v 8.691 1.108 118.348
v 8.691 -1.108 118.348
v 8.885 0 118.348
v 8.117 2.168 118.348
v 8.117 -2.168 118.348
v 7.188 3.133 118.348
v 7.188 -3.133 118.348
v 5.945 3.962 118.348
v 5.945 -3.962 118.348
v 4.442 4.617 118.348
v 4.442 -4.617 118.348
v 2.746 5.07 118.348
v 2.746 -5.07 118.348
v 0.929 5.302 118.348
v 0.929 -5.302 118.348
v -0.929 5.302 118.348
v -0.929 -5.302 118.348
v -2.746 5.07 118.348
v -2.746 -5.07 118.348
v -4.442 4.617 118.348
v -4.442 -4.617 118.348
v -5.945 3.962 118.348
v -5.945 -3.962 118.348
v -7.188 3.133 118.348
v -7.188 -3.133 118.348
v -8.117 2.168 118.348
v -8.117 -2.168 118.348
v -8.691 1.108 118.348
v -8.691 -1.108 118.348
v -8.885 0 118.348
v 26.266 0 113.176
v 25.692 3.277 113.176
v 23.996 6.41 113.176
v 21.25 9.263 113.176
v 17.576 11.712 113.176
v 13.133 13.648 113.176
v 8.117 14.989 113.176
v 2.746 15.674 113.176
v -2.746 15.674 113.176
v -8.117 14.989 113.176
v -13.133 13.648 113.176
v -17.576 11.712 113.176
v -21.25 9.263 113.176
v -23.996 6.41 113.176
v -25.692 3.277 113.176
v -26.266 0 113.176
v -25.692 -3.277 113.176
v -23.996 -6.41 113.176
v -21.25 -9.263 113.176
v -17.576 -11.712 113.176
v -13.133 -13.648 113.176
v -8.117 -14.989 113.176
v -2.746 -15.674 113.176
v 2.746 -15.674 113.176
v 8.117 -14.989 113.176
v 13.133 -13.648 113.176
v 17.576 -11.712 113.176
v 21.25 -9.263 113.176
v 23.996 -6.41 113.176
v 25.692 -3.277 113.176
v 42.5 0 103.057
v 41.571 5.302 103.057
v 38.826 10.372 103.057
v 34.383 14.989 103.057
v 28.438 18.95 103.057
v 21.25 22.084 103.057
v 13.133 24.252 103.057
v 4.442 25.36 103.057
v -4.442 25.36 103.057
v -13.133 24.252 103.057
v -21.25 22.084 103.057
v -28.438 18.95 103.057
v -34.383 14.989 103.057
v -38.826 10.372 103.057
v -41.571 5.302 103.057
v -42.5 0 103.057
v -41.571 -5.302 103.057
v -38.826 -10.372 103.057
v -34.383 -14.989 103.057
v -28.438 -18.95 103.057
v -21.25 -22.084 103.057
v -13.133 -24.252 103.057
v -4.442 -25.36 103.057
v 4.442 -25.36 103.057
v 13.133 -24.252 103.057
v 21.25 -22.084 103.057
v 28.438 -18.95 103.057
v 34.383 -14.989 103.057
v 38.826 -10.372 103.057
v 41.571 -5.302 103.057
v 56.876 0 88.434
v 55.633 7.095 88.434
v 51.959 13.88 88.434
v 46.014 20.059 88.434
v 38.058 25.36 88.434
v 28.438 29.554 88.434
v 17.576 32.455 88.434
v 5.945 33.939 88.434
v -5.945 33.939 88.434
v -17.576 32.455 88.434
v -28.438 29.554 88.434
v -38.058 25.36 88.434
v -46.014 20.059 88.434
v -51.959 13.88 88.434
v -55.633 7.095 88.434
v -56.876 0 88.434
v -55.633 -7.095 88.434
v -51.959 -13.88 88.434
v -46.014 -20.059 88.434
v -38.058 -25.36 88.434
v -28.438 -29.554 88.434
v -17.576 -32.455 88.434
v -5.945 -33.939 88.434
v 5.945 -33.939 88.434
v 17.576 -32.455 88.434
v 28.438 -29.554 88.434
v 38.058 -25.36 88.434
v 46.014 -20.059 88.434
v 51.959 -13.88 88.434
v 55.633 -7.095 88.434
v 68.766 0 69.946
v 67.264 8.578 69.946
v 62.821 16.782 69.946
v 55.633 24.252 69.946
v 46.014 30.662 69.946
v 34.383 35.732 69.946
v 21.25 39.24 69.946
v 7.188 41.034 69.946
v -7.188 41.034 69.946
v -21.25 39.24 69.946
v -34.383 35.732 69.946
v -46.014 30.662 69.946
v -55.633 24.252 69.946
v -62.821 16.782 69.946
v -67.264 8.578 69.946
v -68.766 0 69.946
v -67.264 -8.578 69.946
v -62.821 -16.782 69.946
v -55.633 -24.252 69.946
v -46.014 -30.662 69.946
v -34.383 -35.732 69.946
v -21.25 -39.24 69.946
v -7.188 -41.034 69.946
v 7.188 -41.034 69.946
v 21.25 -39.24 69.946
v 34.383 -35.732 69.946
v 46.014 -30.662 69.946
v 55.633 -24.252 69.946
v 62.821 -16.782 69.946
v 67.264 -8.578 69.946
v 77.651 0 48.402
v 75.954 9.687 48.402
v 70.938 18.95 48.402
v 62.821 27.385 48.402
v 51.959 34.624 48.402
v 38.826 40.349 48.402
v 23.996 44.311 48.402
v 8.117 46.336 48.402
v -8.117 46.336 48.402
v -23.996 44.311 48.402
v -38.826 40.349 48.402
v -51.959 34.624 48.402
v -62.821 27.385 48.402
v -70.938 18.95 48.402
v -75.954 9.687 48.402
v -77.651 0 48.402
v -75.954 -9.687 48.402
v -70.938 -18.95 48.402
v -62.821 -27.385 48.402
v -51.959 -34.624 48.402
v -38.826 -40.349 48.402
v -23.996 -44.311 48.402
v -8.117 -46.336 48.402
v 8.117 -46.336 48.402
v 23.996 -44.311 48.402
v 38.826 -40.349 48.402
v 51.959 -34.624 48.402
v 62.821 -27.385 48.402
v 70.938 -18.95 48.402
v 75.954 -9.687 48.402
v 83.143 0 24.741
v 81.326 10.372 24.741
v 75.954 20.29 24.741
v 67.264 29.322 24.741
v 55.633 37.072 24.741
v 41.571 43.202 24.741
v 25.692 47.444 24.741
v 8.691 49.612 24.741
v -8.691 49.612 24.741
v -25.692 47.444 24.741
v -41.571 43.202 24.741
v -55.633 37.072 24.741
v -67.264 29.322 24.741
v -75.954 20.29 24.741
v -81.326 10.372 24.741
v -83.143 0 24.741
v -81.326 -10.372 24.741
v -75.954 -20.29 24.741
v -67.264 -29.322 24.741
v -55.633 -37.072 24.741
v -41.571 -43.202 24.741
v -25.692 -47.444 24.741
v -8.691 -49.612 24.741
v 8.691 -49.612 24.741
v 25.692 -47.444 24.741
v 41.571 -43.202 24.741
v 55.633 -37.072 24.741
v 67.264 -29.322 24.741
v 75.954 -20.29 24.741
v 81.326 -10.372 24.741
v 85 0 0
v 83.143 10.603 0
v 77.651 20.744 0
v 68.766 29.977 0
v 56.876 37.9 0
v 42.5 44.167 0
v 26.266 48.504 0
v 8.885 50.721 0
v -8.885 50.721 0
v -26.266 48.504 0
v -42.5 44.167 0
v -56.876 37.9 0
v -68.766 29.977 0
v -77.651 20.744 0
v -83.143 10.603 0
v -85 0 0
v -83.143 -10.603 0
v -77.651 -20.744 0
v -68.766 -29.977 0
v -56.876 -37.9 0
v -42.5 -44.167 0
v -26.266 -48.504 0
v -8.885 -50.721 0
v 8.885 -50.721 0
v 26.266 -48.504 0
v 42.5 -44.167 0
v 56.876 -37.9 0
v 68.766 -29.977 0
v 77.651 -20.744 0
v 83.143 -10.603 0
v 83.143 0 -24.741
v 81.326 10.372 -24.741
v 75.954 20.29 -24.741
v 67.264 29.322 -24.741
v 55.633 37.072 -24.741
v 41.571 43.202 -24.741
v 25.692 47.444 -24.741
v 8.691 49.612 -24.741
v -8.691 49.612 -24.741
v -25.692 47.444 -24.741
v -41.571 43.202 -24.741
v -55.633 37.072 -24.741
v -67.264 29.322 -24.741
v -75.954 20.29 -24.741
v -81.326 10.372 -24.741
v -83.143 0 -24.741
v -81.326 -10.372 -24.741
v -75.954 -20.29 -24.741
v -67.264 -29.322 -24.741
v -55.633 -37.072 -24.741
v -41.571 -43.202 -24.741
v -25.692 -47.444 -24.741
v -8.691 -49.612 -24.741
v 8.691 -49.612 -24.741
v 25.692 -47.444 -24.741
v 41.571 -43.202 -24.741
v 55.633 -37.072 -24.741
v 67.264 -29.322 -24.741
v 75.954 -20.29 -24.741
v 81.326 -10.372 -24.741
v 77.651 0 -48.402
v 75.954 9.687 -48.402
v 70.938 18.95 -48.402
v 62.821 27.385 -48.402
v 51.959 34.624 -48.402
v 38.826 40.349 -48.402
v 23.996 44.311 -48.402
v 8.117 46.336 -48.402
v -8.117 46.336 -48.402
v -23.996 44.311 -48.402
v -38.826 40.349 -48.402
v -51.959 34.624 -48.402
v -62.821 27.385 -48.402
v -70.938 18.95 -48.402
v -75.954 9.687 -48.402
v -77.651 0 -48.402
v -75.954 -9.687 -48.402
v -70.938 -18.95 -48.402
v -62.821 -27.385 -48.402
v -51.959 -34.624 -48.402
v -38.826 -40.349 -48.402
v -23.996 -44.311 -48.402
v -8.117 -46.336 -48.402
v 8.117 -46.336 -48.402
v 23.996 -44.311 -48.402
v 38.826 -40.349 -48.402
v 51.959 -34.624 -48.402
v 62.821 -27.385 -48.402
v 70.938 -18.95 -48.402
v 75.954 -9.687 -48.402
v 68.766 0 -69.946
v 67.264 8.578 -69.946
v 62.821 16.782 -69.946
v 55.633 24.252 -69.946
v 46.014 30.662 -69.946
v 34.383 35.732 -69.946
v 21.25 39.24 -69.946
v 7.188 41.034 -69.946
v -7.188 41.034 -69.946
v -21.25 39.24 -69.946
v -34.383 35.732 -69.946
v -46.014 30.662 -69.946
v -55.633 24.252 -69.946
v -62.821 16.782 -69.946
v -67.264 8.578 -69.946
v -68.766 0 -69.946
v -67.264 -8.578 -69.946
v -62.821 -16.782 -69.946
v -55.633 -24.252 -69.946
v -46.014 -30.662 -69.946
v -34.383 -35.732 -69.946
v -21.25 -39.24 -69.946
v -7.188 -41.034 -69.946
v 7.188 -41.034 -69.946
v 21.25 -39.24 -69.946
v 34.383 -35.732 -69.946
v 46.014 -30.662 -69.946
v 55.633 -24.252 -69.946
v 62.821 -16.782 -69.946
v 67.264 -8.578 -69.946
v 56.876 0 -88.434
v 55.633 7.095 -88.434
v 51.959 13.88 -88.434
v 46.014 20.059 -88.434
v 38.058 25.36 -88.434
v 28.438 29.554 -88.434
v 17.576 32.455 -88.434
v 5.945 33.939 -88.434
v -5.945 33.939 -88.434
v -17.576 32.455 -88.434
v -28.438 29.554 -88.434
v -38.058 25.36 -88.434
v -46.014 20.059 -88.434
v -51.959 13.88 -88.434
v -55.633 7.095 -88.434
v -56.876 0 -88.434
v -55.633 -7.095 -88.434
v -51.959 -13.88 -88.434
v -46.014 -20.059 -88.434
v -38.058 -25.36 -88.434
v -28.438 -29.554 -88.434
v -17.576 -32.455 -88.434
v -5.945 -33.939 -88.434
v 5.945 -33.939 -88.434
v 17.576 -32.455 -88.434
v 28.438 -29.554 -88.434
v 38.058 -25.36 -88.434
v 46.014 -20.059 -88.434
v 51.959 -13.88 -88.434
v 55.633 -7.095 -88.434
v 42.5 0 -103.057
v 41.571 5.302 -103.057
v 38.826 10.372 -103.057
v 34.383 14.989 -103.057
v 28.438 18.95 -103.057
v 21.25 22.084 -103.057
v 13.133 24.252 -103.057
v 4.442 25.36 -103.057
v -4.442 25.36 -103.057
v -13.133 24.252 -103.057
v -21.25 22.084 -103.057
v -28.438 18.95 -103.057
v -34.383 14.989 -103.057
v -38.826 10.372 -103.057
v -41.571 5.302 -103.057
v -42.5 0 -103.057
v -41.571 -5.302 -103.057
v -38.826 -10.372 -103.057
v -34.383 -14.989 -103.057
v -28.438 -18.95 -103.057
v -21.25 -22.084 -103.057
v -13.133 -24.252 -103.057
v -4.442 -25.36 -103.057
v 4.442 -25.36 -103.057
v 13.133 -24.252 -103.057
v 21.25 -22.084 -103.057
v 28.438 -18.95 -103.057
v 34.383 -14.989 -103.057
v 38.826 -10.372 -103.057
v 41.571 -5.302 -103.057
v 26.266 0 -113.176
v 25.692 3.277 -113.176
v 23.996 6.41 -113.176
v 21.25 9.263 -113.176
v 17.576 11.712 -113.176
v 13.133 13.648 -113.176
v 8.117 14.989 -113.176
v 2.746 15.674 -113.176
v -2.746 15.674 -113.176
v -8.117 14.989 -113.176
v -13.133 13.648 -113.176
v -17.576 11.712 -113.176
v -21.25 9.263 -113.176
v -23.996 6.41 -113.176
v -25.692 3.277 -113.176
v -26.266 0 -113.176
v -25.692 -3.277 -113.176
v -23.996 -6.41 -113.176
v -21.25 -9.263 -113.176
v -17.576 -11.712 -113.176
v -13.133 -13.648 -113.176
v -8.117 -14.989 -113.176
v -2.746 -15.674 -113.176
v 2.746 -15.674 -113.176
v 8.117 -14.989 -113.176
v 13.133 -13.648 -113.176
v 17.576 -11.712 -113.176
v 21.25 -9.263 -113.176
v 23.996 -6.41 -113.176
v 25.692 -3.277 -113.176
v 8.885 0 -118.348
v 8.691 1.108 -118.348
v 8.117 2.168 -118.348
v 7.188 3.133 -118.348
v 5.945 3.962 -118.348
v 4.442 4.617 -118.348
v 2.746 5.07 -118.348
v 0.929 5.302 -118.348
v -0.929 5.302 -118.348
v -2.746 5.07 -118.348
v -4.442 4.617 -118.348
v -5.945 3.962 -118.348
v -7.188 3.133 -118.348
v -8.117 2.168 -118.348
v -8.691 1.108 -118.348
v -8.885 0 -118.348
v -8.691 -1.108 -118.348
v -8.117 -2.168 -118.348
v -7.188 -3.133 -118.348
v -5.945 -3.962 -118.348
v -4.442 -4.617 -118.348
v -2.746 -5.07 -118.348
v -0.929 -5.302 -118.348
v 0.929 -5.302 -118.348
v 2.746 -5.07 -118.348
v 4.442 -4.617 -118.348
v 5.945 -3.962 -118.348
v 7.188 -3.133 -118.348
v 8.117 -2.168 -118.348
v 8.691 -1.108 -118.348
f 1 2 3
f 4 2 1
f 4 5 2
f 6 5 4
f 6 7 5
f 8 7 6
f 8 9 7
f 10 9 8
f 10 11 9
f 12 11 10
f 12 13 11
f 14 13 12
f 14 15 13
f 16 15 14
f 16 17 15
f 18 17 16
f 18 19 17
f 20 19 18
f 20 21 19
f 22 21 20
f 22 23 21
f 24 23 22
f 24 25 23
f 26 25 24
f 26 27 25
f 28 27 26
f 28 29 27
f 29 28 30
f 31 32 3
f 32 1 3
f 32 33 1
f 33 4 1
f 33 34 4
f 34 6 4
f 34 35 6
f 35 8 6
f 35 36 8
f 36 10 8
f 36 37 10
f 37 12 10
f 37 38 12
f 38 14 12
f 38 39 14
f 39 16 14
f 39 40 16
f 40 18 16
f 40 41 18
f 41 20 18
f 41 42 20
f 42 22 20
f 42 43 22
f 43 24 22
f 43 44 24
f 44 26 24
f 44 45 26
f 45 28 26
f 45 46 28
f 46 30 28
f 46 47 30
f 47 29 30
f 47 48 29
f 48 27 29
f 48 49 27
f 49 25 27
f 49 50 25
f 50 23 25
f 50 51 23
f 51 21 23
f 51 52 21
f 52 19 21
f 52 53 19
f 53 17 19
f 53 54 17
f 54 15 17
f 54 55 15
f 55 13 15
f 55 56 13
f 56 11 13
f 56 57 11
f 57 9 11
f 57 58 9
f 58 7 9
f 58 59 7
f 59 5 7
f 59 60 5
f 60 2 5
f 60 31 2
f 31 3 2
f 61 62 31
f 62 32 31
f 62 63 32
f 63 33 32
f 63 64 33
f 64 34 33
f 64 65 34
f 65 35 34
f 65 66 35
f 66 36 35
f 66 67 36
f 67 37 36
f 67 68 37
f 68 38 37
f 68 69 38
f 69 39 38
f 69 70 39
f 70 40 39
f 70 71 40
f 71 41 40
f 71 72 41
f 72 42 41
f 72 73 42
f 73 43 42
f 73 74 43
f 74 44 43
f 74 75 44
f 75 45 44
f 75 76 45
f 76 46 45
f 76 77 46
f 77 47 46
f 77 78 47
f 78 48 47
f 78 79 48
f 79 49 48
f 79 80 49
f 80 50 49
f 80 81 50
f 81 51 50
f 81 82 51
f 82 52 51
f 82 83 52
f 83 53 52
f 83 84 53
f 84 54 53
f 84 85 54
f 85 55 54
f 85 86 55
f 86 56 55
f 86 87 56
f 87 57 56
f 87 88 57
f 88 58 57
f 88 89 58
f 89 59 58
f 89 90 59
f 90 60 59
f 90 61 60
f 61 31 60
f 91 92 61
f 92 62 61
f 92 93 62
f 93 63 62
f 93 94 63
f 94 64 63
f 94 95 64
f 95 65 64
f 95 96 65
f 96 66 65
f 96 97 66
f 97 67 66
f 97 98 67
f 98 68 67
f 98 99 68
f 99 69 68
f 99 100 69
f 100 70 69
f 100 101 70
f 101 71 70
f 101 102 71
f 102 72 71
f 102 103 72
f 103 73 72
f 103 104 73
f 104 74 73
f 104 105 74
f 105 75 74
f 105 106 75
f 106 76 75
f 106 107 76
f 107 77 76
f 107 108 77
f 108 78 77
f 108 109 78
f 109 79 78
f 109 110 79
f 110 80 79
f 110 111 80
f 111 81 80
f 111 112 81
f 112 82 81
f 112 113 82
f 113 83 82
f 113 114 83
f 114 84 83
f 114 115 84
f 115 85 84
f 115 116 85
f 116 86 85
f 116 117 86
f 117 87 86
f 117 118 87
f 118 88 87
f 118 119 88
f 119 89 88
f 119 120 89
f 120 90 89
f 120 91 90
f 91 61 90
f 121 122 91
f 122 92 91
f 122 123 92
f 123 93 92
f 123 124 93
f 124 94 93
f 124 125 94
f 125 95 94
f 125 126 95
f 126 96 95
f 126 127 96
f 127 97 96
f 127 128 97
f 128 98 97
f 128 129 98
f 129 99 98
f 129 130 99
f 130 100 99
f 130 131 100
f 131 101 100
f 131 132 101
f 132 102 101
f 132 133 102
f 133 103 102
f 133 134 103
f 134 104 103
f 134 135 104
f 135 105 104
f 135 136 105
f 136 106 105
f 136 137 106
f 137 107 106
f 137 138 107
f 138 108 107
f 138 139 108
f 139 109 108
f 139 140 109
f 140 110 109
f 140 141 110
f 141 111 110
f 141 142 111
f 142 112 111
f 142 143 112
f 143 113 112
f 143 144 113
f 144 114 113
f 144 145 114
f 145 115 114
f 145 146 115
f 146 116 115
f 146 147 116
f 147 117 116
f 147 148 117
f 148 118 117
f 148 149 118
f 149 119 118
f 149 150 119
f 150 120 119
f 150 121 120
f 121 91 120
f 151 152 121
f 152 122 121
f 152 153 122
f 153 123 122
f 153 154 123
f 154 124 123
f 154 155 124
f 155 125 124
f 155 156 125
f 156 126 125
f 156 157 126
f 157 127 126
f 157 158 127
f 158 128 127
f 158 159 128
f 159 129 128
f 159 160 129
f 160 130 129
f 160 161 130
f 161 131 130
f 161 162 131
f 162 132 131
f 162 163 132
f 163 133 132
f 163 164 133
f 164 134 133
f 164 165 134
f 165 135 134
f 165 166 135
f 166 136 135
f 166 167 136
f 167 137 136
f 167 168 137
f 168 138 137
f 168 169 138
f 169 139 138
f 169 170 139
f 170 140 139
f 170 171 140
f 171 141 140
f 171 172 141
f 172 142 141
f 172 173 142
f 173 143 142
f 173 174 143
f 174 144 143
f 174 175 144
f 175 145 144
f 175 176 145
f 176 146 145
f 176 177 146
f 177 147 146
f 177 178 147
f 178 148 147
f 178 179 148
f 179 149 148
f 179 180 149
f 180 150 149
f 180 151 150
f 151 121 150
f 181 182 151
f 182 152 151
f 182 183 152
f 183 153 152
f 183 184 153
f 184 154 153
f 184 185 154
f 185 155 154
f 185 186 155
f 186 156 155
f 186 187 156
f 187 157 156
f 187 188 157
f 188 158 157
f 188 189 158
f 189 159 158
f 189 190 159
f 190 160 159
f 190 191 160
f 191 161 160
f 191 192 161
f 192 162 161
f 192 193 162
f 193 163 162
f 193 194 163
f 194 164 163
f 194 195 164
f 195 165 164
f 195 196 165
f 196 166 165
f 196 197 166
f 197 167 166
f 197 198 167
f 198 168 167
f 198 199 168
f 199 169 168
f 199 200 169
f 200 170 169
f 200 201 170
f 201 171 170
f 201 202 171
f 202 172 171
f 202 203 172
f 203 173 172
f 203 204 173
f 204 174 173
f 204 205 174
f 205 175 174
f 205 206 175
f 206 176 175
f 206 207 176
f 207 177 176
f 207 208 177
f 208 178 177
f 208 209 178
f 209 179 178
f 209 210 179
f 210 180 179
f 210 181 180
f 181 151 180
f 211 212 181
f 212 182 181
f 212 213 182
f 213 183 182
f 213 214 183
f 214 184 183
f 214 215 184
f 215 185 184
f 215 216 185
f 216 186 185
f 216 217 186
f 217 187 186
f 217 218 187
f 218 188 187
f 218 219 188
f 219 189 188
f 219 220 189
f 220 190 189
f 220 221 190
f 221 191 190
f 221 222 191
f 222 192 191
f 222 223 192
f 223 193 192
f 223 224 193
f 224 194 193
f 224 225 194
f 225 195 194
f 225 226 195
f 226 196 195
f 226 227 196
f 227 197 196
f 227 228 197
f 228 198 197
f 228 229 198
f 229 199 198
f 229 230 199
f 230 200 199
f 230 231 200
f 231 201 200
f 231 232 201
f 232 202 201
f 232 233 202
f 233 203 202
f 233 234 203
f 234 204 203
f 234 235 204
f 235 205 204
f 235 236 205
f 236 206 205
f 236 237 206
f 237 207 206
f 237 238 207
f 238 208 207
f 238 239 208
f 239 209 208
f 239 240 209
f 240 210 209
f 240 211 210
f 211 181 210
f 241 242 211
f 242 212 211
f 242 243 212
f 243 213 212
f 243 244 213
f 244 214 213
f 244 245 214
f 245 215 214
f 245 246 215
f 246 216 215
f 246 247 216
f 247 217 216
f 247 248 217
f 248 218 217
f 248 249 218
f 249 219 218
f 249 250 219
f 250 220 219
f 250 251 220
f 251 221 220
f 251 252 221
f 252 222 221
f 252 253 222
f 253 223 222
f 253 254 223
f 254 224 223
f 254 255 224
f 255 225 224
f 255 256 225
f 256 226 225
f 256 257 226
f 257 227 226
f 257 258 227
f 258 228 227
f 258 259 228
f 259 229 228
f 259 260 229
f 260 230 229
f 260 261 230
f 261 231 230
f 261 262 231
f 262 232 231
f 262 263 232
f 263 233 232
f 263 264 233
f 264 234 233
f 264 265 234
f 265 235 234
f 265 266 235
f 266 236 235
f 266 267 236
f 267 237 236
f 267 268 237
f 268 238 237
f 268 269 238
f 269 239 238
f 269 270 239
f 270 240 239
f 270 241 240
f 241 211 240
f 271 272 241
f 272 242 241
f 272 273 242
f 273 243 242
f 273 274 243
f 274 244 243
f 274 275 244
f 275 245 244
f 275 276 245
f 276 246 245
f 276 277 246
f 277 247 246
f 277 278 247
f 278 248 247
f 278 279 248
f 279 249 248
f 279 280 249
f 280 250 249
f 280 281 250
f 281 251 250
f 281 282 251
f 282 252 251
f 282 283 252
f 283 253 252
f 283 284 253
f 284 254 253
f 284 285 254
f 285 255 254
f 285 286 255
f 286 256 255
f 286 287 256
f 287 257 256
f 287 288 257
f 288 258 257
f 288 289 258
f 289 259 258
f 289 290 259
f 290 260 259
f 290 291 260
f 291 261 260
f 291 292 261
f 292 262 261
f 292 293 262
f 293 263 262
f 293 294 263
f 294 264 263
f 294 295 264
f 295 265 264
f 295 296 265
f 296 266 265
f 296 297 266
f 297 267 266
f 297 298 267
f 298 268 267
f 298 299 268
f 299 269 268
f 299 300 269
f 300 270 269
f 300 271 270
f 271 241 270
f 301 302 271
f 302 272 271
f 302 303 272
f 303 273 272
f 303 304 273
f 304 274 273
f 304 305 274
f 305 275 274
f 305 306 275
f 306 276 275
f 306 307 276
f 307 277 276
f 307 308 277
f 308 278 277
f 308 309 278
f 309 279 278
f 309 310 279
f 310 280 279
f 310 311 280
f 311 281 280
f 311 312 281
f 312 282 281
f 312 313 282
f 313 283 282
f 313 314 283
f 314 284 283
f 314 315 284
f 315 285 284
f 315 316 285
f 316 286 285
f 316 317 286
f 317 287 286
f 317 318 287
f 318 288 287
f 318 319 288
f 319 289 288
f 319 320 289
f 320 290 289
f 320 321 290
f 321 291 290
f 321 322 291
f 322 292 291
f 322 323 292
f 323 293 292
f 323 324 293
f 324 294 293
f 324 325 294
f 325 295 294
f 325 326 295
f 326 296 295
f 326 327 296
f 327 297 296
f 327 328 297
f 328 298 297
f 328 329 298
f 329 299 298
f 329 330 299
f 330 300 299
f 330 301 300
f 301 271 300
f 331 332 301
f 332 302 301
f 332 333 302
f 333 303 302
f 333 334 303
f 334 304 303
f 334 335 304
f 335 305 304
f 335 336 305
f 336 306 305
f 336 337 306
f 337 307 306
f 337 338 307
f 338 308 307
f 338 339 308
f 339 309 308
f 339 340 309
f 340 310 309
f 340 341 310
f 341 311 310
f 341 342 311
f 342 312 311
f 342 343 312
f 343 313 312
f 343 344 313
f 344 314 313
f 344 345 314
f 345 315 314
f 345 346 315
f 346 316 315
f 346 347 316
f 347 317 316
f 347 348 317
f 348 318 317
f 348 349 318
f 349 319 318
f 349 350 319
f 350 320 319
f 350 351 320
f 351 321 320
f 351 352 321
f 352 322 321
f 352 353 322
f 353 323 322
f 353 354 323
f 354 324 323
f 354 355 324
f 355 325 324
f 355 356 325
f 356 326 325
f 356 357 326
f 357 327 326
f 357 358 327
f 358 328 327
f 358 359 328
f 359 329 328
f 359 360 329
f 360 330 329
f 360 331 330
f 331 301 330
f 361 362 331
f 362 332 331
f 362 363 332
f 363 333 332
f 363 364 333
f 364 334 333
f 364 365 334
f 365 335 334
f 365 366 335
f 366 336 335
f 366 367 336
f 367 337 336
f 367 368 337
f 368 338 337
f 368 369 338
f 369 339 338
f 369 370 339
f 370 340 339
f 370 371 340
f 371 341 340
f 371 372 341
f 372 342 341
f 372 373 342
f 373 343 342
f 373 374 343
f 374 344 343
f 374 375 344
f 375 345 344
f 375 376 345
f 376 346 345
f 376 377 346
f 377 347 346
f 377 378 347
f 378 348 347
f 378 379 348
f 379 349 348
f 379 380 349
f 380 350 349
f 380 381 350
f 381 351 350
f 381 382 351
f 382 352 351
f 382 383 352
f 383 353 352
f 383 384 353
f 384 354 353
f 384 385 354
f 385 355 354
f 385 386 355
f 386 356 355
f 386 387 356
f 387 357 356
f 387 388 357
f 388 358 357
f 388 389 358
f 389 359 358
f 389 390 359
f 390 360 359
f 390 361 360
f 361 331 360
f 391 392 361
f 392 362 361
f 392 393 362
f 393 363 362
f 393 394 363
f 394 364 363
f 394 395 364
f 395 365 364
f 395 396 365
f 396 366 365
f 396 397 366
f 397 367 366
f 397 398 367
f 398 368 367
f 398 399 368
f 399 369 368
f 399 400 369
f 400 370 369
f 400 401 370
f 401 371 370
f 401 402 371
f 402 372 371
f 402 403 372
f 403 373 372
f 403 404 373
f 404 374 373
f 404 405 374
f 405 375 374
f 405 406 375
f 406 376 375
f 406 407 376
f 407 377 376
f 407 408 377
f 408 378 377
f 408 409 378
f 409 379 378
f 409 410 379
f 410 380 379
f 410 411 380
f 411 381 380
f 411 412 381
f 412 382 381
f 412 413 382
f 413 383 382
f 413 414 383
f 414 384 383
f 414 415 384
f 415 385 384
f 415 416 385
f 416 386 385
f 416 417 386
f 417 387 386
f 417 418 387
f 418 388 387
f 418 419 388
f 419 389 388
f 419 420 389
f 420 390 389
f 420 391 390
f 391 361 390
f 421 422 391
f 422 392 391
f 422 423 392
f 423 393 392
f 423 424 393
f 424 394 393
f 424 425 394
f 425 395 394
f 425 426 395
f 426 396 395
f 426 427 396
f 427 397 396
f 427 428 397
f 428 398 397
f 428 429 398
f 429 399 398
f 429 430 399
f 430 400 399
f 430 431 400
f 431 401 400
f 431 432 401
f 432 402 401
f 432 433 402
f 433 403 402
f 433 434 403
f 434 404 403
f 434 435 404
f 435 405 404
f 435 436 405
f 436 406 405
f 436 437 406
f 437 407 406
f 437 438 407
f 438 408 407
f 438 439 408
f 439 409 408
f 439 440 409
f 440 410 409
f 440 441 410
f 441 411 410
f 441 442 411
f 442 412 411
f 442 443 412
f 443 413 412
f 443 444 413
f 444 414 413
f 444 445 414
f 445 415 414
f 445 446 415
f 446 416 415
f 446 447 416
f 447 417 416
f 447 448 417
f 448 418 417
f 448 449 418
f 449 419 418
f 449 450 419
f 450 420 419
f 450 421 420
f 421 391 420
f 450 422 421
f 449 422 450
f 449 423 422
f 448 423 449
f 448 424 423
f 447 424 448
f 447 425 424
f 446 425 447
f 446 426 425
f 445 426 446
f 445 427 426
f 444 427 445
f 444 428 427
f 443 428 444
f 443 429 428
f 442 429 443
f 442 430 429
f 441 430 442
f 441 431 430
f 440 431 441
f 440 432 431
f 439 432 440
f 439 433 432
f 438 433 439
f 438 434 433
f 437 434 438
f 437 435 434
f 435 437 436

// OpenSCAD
// Generated by SolidPython 1.0.1 on 2020-07-29 00:46:46


scale(v = [5, 3, 7]) {
	sphere(r = 17);
}
/***********************************************
*********      SolidPython code:      **********
************************************************
 
# import packages: SolidPython
from solid import *
from solid.utils import *
from itertools import chain, combinations, permutations


class Resize:

    def __init__(self, scad_file):
        self.scad_file = scad_file
        #self.scad_file = import_scad(scad_file)
        # cone/cylinder param:
        self.r1 = 0
        self.r2 = 0
        self.h = 0
        # rectangular prism param:
        self.w = 0
        self.l = 0
        # ellipse param:
        self.r = 0

    # import OpenScad code (file name corresponds to shape)


    # classify shape + parameters
    def assign(self, param1, param2, param3):
        if self.scad_file == 'cone.scad':
            self.r1 = param1
            self.r2 = param2
            self.h = param3
        elif self.scad_file == 'cylinder.scad':
            self.r1 = param1
            self.r2 = param2
            self.h = param3
        elif self.scad_file == 'rectangularPrism.scad':
            self.h = param1
            self.l = param2
            self.w = param3
        else:
            self.r = param1
            self.h = param2

    # resize parameters
    def iterate(self):
        x = range(3, 20, 2)
        i = 1
        if self.scad_file == 'cone.scad':
            tempList = list(permutations(x, 2))
            for temp in tempList:
                param1 = temp[0]
                param2 = temp[1]
                filepath = 'produced_scad_files/' + 'cone' + str(param1) + '_' + str(param2) + '_' + '.scad'
                scad_render_to_file(cylinder(h=param1, r1=param2, r2=0), filepath)

        elif self.scad_file == 'cylinder.scad':
            tempList = list(permutations(x, 3))
            for temp in tempList:
                param1 = temp[0]
                param2 = temp[1]
                filepath = 'produced_scad_files/' + 'cylinder' + str(param1) + '_' + str(param2) + '_' + '.scad'
                scad_render_to_file(cylinder(h=param1, r1=param2, r2=param2), filepath)

        elif self.scad_file == 'rectangularPrism.scad':
            tempList = list(permutations(x, 3))
            for temp in tempList:
                param1 = temp[0]
                param2 = temp[1]
                param3 = temp[2]
                filepath = 'produced_scad_files/' + 'rectangularPrism' + str(param1) + '_' + str(param2) + '_' + str(
                    param3) + '.scad'
                scad_render_to_file(cube(size=(param1, param2, param3)), filepath)

        elif self.scad_file == 'ellipse.scad':
            tempList = list(permutations(x, 4))
            for temp in tempList:
                param1 = temp[0]
                param2 = temp[1]
                param3 = temp[2]
                param4 = temp[3]
                filepath = 'produced_scad_files/' + 'ellipse' + str(param1) + '_' + str(param2) + '_' + str(param3) + '_' + str(param4) + '.scad'
                scad_render_to_file(scale([param1, param2, param3])(sphere(r=param4)), filepath)

    def render_to_scadfile(self):
        scad_render_to_file(scad, 'example.scad') 
 
************************************************/
